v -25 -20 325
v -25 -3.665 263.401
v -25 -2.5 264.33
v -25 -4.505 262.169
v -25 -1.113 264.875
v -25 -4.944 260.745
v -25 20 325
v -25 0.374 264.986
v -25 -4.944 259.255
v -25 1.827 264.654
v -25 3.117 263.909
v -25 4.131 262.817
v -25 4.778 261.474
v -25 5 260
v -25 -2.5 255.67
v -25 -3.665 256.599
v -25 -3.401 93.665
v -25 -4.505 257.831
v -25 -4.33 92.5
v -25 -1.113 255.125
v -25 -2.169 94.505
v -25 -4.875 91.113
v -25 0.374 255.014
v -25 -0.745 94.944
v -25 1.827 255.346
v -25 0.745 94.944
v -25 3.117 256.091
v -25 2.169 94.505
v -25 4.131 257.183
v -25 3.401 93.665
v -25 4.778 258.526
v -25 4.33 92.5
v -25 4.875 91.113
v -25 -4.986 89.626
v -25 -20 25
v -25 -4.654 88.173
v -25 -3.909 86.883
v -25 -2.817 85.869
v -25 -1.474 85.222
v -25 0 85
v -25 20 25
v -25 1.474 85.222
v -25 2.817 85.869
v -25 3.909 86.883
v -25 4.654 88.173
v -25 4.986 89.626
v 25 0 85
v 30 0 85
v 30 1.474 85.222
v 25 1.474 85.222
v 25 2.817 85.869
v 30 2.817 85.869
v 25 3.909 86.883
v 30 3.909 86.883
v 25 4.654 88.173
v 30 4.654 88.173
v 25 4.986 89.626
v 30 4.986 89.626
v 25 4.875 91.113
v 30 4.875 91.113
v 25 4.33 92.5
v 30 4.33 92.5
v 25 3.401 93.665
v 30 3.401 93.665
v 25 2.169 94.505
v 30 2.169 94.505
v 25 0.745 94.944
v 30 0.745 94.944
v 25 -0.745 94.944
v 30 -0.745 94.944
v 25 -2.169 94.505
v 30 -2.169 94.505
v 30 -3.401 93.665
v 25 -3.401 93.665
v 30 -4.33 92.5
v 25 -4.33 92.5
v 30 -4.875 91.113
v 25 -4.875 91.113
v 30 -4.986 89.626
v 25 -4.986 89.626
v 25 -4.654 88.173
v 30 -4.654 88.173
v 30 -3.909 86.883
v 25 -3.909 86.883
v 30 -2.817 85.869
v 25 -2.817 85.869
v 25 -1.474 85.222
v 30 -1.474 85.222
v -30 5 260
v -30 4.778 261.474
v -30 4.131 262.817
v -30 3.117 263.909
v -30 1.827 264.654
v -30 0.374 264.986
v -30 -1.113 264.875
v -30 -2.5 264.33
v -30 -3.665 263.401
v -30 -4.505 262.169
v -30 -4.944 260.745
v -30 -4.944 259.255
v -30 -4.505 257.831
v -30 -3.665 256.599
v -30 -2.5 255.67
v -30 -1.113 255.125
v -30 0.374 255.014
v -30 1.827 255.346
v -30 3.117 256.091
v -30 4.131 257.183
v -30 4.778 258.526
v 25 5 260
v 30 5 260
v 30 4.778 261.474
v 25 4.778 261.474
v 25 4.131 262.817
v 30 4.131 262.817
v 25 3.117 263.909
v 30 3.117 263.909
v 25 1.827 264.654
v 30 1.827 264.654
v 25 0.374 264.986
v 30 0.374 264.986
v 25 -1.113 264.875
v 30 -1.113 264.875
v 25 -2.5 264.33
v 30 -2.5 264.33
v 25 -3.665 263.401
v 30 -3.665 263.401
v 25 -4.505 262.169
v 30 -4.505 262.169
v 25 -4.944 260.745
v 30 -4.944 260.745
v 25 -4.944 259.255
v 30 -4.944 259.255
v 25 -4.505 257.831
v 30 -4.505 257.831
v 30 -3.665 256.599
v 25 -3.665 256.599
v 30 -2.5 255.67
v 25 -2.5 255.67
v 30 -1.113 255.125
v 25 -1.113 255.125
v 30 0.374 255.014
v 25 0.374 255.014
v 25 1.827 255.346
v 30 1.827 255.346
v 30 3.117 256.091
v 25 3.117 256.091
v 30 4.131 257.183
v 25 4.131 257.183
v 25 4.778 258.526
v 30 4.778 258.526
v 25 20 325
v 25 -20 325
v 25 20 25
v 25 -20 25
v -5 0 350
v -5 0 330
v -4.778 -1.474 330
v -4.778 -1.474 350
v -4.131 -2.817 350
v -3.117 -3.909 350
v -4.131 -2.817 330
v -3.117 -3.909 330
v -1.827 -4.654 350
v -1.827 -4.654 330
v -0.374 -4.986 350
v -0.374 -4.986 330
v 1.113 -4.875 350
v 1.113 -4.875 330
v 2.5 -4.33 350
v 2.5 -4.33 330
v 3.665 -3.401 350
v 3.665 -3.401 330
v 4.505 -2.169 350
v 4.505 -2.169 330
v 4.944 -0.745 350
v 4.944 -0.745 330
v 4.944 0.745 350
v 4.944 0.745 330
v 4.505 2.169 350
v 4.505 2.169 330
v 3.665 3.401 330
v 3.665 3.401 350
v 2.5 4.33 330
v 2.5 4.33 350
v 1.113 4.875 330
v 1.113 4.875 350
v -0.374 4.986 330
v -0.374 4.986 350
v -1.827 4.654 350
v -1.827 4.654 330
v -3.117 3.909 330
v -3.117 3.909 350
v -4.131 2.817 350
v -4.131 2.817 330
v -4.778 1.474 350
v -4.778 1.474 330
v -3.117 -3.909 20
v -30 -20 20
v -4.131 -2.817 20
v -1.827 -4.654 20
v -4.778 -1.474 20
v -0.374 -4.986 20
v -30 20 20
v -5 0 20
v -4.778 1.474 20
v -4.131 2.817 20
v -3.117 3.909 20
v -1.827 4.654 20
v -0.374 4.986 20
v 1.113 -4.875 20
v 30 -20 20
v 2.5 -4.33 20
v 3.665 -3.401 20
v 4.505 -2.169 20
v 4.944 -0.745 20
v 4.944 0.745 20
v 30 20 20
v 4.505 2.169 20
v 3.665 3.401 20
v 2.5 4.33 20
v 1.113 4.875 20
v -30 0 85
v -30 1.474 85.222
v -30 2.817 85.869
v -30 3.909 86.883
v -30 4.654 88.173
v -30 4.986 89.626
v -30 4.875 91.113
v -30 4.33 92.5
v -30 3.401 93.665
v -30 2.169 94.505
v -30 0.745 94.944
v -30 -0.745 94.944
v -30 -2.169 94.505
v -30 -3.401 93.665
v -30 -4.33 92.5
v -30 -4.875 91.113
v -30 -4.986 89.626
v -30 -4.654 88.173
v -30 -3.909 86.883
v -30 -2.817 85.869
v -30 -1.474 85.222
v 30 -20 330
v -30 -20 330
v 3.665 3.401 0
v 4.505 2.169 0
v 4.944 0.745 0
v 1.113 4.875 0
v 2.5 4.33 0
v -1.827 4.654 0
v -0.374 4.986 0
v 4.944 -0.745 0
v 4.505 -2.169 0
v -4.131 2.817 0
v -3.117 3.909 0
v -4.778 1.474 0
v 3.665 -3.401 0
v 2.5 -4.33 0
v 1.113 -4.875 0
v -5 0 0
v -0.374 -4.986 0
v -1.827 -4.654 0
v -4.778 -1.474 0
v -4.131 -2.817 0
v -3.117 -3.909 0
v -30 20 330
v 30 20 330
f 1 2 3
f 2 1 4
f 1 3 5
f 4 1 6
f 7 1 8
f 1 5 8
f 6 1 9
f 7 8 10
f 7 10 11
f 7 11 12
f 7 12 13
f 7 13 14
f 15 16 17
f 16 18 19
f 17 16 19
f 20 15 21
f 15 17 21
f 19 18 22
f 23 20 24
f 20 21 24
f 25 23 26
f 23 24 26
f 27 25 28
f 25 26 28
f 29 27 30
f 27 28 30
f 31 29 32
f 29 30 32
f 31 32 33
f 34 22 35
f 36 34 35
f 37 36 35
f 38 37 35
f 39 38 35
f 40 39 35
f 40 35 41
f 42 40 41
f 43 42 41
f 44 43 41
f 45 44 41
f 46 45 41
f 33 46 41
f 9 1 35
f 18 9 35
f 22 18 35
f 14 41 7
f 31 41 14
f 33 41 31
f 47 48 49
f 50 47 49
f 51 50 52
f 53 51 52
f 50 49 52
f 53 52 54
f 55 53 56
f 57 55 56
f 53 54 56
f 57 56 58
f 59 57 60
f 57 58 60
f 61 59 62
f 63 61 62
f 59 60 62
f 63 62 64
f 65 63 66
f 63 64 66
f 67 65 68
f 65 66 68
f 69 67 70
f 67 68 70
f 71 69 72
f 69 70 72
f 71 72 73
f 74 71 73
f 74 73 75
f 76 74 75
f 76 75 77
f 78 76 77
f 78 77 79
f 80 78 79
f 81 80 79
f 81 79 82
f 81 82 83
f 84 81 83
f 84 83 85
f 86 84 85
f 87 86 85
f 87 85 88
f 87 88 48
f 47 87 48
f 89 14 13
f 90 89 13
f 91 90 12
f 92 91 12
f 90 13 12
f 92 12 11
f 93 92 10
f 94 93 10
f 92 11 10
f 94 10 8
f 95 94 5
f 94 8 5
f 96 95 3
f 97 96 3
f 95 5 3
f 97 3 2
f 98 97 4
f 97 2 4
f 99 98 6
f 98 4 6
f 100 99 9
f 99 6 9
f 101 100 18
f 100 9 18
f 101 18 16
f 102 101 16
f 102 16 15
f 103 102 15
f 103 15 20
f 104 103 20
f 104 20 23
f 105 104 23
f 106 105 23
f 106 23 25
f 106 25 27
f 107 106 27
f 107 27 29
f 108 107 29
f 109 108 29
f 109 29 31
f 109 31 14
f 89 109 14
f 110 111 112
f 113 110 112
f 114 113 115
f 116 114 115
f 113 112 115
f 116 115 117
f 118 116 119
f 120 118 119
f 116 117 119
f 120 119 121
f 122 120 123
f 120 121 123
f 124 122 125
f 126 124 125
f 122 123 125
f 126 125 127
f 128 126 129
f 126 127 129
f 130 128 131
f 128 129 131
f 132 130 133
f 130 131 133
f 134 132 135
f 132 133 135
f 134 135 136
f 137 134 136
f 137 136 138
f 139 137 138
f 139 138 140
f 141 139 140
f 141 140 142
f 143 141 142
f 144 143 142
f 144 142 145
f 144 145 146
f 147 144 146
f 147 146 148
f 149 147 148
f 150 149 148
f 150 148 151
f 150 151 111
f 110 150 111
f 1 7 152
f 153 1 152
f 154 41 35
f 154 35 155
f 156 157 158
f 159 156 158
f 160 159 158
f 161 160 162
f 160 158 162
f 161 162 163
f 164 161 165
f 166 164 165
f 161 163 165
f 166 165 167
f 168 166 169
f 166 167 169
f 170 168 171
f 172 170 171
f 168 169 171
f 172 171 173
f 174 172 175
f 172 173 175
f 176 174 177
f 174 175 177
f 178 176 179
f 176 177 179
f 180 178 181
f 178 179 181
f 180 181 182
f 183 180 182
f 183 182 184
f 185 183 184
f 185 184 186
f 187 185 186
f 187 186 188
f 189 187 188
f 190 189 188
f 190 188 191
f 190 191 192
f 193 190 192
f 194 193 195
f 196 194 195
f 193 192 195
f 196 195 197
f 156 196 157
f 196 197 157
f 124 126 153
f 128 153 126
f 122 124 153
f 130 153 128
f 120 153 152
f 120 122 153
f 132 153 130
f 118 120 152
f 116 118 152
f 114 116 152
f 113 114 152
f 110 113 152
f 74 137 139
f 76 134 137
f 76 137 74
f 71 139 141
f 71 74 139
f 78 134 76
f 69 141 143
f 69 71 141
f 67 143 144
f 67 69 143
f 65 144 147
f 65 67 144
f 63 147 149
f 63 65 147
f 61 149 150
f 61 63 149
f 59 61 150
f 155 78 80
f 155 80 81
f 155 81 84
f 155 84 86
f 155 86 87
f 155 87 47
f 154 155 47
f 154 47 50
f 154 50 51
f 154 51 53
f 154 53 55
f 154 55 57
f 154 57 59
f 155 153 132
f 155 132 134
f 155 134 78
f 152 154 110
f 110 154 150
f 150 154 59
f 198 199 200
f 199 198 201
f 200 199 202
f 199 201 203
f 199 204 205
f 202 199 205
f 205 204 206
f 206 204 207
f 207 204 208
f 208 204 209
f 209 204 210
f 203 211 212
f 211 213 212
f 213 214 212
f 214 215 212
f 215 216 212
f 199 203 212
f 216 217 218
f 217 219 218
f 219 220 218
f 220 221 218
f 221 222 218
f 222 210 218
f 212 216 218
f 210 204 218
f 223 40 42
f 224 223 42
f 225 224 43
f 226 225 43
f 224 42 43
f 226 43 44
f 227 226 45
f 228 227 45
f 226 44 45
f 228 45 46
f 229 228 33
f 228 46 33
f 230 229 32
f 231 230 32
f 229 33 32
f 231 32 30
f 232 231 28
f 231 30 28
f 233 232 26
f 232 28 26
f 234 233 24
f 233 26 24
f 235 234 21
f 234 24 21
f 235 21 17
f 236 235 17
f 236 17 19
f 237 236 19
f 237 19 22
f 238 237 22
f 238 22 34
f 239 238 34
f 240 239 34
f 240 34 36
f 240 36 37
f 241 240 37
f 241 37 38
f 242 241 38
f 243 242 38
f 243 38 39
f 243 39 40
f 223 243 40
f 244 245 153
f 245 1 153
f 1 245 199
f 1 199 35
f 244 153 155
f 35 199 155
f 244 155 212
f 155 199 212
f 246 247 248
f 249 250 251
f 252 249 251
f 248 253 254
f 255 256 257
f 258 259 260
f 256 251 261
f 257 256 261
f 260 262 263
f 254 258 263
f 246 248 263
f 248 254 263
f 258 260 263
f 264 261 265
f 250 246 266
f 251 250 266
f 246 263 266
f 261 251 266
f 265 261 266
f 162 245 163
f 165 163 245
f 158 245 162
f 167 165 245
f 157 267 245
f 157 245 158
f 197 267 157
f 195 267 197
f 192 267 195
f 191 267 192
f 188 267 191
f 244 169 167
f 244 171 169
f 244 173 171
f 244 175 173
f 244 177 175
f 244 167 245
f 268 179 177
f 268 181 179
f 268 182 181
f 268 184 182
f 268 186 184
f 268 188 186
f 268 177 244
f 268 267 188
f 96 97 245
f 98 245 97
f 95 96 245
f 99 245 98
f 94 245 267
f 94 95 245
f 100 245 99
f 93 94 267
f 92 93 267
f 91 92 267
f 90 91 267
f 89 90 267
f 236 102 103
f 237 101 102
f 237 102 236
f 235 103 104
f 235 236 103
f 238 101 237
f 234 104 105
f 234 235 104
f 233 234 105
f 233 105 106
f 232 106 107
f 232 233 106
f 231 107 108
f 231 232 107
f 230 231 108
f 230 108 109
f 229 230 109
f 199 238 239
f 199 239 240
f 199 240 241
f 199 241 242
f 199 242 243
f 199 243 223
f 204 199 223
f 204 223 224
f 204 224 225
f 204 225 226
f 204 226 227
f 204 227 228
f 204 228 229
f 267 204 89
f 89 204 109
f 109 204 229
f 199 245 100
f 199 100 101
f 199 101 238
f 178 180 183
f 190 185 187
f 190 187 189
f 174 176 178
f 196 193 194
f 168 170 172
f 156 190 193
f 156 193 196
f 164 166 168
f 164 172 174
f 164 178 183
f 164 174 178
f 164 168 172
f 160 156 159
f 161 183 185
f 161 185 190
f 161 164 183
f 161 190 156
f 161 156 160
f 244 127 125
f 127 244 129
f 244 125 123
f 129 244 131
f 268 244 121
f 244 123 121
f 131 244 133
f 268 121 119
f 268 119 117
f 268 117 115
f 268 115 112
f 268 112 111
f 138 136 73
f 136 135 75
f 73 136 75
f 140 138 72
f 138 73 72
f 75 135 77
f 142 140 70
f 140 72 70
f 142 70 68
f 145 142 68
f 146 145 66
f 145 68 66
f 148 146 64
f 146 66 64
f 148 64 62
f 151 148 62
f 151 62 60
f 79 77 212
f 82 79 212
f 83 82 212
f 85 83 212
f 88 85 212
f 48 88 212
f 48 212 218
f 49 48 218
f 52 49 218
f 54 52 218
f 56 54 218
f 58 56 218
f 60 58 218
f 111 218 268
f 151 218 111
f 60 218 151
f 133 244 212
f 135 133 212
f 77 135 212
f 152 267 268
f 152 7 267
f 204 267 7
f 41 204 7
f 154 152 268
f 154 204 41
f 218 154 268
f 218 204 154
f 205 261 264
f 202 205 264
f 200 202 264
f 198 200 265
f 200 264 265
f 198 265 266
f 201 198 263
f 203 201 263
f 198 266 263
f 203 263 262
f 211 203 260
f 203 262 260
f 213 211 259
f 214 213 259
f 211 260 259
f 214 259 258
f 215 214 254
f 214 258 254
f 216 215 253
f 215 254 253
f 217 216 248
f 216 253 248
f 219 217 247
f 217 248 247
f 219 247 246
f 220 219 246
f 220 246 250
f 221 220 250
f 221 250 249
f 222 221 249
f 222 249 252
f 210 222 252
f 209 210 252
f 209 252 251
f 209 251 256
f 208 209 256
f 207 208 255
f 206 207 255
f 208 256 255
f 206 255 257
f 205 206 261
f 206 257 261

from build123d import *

# Parameters (mm, degrees)
SKETCH_7_R          = 5
EXTRUDE_5_DEPTH     = 20
SKETCH_8_W          = 60
SKETCH_8_H          = 40
EXTRUDE_7_DEPTH     = 5
SKETCH_9_W          = 5
SKETCH_9_H          = 40
EXTRUDE_8_DEPTH     = 300
SKETCH_10_W         = 60
SKETCH_10_H         = 40
EXTRUDE_9_DEPTH     = 5
SKETCH_11_R         = 5
EXTRUDE_10_DEPTH    = 20
SKETCH_12_R         = 5
CUT_EXTRUDE_1_DEPTH = 96


with BuildPart() as part:
    # Эскиз7 → Бобышка-Вытянуть5 (new body)
    with BuildSketch(Plane.XY):
        with Locations(Location((0, 0, 0), (0, 0, 180))):
            Circle(SKETCH_7_R)
    extrude(amount=EXTRUDE_5_DEPTH)

    # Эскиз8 → Бобышка-Вытянуть7 (add)
    with BuildSketch(Plane.XY.offset(20)):
        Rectangle(SKETCH_8_W, SKETCH_8_H)
    extrude(amount=EXTRUDE_7_DEPTH)

    # Эскиз9 → Бобышка-Вытянуть8 (add)
    with BuildSketch(Plane.XY.offset(25)):
        with Locations((-27.5, 0)):
            Rectangle(SKETCH_9_W, SKETCH_9_H)
        with Locations((27.5, 0)):
            Rectangle(SKETCH_9_W, SKETCH_9_H)
    extrude(amount=EXTRUDE_8_DEPTH)

    # Эскиз10 → Бобышка-Вытянуть9 (add)
    with BuildSketch(Plane.XY.offset(325)):
        Rectangle(SKETCH_10_W, SKETCH_10_H)
    extrude(amount=EXTRUDE_9_DEPTH)

    # Эскиз11 → Бобышка-Вытянуть10 (add)
    with BuildSketch(Plane.XY.offset(330)):
        with Locations(Location((0, 0, 0), (0, 0, 180))):
            Circle(SKETCH_11_R)
    extrude(amount=EXTRUDE_10_DEPTH)

    # Эскиз12 → Вырез-Вытянуть1 (cut)
    with BuildSketch(Plane(origin=(30, 0, 0), x_dir=(0, 0, -1), z_dir=(1, 0, 0))):
        with Locations((-90, 0)):
            Circle(SKETCH_12_R)
        with Locations(Location((-260, 0, 0), (0, 0, 90))):
            Circle(SKETCH_12_R)
    extrude(amount=-CUT_EXTRUDE_1_DEPTH, mode=Mode.SUBTRACT)


solid = part.part
